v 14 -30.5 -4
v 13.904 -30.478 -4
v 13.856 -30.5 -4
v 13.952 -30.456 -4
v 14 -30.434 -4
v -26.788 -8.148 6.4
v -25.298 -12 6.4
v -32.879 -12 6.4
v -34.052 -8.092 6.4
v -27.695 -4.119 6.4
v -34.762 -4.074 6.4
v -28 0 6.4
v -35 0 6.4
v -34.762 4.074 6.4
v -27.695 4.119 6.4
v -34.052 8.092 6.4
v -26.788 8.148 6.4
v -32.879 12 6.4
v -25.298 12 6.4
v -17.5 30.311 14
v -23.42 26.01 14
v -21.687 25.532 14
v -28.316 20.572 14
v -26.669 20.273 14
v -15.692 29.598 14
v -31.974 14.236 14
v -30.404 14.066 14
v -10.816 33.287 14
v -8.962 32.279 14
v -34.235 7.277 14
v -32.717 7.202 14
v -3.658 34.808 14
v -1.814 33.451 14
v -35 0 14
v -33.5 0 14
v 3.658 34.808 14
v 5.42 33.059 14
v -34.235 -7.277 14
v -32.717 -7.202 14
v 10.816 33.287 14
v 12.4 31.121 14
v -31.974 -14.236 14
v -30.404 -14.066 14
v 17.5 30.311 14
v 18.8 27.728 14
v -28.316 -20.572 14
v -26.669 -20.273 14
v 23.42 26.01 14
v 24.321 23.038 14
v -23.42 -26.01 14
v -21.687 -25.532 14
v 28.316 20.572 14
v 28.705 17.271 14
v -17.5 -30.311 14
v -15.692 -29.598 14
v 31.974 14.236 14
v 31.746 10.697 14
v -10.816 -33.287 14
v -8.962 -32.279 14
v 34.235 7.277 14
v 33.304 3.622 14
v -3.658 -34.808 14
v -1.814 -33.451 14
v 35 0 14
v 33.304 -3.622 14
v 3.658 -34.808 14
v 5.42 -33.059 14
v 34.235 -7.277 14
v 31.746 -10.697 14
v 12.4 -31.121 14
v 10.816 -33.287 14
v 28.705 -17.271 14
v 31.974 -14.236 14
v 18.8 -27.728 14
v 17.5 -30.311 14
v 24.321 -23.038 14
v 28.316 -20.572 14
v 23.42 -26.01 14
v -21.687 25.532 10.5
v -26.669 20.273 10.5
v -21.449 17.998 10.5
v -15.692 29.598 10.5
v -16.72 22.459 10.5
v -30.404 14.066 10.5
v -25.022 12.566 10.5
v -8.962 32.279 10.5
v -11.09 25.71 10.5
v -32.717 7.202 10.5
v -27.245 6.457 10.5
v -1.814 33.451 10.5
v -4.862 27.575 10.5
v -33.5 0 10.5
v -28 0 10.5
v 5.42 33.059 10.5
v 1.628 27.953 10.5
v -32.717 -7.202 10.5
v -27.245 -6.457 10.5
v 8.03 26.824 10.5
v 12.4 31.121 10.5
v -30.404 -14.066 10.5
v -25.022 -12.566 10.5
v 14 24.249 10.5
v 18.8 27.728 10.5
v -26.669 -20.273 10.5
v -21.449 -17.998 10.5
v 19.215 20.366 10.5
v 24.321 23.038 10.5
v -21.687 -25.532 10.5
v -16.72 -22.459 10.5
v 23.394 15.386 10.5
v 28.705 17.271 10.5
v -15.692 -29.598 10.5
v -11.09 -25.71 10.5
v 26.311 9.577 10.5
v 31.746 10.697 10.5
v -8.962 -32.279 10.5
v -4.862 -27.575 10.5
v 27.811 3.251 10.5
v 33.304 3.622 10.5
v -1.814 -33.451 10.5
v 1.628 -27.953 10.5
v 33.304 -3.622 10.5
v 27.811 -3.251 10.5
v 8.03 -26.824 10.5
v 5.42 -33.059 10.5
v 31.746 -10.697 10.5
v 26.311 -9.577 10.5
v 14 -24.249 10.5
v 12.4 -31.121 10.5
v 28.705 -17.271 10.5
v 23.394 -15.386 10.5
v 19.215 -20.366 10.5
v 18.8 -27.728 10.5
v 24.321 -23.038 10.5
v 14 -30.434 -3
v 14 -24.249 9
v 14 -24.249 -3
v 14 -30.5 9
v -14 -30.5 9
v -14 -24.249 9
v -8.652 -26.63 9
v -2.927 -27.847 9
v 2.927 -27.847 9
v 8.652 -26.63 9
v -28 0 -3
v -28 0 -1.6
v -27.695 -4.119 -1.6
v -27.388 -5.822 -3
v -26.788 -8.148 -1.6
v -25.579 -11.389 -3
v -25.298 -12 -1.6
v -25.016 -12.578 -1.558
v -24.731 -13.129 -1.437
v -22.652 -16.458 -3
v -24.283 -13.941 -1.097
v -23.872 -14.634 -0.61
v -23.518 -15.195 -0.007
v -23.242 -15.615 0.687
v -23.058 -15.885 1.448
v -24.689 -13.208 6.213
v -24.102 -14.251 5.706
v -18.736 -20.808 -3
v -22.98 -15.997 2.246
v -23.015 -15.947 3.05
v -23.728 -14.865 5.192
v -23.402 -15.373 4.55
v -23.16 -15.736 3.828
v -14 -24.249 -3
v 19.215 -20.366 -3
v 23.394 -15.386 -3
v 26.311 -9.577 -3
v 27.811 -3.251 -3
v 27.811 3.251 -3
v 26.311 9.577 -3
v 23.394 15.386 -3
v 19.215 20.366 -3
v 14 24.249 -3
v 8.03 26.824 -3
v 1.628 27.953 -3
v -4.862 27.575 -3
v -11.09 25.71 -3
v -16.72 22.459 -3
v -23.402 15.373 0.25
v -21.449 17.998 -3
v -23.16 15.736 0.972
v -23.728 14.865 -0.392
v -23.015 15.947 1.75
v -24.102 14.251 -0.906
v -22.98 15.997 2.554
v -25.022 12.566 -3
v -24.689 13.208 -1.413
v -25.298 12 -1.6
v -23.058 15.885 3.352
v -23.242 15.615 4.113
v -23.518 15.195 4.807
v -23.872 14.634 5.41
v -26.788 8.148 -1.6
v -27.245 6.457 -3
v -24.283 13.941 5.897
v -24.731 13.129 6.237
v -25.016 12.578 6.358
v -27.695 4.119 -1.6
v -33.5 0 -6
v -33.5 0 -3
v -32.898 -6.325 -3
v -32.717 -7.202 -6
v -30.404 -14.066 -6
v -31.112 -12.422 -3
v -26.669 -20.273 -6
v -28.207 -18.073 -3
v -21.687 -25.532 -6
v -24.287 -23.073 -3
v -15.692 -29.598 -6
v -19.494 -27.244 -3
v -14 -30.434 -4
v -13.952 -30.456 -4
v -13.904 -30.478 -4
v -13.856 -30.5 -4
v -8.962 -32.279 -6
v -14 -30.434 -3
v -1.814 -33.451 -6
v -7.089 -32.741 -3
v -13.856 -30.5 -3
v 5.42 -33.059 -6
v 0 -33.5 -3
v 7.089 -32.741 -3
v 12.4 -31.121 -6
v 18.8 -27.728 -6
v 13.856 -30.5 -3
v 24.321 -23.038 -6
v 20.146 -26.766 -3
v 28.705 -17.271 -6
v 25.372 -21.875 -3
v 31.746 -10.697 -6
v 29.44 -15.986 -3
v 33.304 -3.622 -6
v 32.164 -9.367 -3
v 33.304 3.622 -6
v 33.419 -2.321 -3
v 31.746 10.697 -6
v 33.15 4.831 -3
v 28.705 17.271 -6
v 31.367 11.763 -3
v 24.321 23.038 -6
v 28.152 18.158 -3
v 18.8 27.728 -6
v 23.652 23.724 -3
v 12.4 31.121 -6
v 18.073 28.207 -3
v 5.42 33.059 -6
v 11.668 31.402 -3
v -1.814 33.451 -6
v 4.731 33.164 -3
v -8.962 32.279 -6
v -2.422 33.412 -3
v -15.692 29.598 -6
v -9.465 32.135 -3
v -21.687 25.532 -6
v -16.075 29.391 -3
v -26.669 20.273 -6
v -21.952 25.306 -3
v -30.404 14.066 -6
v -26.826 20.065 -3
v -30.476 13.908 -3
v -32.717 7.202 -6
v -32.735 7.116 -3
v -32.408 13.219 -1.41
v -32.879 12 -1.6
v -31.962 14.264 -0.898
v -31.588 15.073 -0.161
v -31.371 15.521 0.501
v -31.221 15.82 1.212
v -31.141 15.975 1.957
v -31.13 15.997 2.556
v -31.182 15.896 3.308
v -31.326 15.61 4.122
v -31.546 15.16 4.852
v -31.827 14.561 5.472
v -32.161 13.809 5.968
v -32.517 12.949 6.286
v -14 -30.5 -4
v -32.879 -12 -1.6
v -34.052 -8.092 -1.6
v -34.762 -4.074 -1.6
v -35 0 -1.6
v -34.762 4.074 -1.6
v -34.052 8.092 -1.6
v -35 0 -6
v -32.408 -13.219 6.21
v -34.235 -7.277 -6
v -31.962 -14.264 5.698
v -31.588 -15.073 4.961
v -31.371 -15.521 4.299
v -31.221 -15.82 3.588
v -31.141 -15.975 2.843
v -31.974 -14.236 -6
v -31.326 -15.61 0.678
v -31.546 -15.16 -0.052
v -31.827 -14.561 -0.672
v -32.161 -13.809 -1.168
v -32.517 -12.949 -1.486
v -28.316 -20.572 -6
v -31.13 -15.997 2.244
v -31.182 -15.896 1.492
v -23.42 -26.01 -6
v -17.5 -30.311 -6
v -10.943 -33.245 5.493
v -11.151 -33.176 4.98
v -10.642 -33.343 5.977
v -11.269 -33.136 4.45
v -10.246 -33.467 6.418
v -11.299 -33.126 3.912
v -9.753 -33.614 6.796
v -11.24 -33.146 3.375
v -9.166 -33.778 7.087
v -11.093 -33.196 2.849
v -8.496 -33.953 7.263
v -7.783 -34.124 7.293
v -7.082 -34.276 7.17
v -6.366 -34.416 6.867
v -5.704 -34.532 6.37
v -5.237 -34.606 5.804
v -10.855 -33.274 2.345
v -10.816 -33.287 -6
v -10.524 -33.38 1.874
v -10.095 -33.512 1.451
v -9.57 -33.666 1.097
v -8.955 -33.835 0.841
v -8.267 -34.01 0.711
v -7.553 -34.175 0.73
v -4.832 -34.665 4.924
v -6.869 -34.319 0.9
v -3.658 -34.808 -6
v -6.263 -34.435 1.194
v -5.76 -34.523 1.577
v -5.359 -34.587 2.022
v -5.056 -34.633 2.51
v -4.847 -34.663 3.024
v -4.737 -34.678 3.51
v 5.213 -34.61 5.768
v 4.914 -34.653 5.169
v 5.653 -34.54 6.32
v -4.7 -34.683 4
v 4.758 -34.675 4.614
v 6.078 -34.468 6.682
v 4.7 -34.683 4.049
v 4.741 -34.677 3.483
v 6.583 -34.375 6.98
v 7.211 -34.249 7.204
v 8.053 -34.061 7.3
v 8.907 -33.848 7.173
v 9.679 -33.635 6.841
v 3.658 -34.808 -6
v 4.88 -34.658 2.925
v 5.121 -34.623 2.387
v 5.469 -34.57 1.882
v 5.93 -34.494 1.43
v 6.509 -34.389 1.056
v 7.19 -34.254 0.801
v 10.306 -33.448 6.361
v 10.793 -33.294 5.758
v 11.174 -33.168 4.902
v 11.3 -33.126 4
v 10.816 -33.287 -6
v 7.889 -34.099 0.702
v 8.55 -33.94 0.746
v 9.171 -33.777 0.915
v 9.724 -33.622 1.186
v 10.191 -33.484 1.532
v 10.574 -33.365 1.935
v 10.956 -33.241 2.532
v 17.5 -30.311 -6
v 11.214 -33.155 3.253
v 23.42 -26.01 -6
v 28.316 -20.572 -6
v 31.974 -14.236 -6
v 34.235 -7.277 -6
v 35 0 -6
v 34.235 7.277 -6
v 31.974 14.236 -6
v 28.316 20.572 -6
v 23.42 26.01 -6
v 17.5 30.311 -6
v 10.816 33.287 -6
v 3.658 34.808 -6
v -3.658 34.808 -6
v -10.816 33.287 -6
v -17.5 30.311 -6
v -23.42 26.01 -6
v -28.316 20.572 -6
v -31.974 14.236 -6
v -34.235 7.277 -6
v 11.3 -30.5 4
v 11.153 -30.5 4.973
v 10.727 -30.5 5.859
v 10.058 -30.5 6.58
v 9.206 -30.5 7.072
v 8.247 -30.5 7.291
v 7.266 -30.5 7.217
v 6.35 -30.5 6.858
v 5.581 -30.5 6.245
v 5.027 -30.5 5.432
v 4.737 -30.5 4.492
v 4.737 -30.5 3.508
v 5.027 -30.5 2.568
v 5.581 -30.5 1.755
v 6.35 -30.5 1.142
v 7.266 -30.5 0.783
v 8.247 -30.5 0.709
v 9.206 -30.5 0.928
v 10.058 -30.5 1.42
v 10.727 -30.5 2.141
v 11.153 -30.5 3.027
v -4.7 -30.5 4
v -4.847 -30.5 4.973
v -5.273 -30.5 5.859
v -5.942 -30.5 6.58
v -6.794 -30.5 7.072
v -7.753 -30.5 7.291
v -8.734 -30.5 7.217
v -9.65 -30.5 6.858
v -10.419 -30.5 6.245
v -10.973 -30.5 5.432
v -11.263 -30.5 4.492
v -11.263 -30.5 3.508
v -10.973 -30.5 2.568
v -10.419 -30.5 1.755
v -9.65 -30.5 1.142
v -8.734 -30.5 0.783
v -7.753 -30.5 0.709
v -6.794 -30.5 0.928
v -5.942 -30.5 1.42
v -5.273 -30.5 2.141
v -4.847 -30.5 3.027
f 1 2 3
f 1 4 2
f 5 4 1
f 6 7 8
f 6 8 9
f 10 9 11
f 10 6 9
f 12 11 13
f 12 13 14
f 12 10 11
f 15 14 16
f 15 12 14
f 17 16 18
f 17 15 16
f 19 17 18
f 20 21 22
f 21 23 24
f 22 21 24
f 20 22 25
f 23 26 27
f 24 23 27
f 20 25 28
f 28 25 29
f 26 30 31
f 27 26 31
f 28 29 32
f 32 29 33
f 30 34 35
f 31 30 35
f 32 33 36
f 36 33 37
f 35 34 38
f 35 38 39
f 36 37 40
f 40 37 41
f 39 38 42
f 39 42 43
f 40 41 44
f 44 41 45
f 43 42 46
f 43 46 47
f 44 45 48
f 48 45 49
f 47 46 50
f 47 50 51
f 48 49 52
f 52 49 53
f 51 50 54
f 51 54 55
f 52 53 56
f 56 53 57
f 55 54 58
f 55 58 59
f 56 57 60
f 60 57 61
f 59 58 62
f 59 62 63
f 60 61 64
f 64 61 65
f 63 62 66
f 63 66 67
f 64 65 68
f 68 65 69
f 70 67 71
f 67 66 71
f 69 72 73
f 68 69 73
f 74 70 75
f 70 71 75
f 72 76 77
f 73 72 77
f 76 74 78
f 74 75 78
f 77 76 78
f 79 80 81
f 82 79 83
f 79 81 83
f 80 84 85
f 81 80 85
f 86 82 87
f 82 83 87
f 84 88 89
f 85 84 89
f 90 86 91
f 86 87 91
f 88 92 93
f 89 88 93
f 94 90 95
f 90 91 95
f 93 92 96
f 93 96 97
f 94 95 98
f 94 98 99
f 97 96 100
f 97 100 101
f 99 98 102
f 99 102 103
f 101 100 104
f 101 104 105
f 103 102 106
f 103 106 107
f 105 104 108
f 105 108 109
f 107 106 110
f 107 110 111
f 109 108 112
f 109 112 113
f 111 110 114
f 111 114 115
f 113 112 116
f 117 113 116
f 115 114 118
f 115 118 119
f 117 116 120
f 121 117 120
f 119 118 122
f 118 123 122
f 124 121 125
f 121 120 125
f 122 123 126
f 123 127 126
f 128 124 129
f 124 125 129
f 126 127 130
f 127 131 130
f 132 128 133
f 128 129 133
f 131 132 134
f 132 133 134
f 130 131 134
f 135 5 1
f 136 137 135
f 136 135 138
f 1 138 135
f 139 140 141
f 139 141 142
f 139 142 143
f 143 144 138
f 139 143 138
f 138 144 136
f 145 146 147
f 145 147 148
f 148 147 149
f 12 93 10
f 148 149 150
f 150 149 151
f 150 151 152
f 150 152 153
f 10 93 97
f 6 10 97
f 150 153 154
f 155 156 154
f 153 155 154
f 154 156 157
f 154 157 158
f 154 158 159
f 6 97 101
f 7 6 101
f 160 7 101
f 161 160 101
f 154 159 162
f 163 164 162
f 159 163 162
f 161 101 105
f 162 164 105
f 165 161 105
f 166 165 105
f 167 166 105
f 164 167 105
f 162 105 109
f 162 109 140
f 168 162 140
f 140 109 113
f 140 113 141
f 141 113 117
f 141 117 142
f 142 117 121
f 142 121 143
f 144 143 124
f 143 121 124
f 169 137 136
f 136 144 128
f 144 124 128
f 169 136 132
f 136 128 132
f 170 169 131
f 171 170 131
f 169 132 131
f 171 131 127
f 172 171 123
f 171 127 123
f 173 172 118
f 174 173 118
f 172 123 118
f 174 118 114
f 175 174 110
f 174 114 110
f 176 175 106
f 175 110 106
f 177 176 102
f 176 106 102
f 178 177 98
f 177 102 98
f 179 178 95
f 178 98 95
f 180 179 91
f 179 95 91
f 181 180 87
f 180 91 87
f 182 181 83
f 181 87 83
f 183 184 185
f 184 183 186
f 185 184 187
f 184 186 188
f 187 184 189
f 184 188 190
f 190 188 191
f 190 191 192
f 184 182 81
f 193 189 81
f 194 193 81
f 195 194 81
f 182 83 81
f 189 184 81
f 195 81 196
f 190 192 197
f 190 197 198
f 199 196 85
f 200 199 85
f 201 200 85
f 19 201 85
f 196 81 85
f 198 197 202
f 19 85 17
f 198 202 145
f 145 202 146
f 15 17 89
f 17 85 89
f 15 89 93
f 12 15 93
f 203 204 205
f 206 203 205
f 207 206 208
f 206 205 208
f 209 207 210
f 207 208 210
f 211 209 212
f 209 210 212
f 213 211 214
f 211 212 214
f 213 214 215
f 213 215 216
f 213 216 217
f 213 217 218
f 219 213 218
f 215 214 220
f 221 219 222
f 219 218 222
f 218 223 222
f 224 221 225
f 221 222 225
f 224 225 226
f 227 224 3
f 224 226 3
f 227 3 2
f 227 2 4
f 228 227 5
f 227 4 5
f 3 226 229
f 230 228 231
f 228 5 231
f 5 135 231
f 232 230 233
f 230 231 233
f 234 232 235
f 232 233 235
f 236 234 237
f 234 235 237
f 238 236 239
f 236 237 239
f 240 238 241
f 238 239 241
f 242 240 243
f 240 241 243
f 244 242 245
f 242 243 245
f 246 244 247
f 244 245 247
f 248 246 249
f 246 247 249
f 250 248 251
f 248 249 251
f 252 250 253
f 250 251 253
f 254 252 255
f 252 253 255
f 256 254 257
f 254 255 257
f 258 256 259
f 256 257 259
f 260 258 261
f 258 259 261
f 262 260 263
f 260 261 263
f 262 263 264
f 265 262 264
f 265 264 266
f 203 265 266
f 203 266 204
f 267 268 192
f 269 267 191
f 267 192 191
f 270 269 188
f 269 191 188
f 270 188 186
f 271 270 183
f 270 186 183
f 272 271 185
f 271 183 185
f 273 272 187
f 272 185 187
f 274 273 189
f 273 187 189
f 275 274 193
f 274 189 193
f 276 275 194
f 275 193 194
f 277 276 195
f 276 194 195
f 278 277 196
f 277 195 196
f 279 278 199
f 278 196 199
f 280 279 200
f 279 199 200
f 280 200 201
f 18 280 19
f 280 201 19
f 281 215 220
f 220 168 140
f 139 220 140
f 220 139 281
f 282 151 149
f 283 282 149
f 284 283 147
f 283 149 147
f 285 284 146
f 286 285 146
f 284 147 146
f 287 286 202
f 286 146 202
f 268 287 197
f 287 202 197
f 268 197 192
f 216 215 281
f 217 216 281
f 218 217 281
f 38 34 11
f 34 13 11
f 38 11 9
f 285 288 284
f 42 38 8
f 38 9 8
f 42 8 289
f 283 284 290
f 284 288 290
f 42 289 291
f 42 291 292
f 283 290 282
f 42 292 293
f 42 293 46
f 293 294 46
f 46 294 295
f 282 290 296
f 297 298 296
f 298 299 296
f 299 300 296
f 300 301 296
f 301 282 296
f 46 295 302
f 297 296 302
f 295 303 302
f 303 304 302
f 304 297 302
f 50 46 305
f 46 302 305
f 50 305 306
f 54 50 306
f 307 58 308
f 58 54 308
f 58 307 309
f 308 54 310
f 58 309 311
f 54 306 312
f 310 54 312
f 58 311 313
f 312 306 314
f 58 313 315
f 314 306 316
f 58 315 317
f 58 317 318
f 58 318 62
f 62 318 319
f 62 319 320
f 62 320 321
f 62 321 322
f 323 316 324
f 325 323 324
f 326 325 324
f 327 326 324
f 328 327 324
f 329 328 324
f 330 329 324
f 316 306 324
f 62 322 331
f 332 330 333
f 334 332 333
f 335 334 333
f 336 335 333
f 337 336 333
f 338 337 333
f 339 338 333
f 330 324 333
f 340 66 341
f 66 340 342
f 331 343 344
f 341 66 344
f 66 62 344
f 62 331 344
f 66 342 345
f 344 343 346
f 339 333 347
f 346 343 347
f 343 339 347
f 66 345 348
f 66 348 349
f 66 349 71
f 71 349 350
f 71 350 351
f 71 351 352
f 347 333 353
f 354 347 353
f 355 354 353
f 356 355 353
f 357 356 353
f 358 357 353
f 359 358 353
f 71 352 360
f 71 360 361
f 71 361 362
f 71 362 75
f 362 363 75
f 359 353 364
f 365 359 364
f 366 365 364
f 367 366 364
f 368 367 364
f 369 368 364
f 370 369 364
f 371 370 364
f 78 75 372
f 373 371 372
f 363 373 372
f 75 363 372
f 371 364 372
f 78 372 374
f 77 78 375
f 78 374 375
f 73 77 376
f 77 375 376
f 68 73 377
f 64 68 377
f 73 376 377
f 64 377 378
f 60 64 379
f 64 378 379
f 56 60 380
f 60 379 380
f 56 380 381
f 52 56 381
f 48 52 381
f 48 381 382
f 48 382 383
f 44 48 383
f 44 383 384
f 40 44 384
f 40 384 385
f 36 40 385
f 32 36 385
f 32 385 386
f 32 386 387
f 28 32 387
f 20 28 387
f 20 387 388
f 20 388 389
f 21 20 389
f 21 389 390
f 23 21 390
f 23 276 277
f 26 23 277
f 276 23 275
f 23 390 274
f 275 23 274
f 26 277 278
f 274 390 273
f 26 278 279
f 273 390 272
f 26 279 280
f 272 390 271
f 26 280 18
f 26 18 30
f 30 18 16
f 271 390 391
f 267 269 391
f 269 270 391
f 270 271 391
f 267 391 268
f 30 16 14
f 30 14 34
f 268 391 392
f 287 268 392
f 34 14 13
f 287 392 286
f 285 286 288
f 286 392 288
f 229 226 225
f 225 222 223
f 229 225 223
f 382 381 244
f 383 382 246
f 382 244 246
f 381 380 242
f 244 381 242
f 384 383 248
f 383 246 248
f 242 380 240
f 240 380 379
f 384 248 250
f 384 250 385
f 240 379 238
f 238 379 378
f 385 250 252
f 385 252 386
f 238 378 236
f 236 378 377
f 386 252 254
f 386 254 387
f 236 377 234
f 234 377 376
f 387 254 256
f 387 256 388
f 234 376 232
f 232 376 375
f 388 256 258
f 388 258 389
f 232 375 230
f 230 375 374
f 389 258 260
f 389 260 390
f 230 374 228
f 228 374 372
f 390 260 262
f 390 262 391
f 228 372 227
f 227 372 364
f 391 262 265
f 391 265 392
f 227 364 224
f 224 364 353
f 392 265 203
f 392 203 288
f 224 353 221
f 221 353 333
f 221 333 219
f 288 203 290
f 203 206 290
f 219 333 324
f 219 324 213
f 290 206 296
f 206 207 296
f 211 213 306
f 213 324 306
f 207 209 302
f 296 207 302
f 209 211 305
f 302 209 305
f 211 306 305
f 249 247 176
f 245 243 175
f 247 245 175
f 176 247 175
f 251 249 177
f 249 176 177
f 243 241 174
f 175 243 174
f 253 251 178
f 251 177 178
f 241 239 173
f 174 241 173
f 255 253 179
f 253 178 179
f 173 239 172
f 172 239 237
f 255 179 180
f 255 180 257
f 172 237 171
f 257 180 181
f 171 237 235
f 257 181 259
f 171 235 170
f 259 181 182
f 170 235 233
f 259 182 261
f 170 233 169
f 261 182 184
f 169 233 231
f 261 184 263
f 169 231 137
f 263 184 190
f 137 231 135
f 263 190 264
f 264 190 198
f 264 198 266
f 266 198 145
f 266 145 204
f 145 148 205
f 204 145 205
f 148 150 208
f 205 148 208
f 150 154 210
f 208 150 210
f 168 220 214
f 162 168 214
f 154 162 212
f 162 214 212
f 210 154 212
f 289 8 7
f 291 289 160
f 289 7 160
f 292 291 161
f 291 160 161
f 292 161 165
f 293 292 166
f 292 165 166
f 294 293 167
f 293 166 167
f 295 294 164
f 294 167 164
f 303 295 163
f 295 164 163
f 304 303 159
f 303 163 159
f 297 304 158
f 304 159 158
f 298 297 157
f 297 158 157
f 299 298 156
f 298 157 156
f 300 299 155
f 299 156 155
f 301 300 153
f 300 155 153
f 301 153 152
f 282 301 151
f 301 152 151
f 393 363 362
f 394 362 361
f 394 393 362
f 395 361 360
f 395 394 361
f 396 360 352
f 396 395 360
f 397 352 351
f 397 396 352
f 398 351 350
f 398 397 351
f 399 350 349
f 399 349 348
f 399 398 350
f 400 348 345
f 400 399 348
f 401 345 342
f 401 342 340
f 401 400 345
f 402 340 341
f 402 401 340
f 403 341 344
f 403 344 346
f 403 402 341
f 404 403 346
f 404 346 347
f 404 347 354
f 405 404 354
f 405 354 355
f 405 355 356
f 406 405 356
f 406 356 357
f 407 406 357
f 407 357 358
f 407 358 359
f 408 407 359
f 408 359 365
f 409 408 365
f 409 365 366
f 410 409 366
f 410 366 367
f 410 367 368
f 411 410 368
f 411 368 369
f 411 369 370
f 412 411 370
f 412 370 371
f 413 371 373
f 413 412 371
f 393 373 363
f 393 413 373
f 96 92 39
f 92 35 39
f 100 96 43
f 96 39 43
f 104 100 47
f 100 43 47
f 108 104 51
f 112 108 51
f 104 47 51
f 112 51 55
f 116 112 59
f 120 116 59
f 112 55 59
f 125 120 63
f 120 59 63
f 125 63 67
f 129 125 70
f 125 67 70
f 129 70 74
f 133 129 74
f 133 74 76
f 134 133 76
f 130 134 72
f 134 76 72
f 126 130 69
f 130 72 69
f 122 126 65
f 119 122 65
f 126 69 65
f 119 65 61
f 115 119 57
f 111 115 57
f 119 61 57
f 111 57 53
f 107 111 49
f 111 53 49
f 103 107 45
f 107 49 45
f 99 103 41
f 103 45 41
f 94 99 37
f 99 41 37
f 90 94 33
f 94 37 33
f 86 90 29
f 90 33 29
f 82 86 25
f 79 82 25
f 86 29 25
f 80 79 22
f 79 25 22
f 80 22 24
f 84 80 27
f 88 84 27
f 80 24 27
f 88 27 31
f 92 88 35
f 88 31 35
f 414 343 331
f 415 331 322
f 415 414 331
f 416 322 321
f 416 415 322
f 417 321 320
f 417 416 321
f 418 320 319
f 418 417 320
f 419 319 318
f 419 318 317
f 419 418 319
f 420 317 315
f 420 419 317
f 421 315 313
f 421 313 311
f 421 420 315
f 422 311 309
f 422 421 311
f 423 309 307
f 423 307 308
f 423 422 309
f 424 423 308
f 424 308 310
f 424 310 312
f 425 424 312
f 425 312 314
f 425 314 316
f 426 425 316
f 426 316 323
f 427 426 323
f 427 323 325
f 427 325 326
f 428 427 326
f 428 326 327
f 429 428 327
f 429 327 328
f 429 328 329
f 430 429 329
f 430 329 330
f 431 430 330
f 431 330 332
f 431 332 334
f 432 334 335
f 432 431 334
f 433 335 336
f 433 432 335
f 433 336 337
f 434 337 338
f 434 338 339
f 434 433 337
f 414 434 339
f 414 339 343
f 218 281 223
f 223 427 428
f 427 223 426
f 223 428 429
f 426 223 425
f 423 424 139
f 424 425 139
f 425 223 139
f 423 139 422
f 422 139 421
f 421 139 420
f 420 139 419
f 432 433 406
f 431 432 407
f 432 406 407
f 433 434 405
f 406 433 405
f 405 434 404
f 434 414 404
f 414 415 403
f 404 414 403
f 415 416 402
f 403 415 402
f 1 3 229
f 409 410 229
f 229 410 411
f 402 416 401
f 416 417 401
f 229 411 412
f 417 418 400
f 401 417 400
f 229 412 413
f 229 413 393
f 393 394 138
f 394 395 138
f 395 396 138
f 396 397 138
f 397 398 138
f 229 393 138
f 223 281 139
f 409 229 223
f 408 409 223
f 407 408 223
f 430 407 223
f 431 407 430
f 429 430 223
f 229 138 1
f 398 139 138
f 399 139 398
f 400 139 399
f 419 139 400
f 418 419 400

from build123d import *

# Parameters (mm, degrees)
SKETCH007_W  = 28
SKETCH007_H  = 13
PAD003_DEPTH = 14.5
SKETCH008_R  = 3.3
PAD004_DEPTH = 10
PAD005_DEPTH = 16


with BuildPart() as body003:
    # Sketch007 → Pad003 (new body)
    with BuildSketch(Plane.XZ):
        with Locations((0, 2.5)):
            Rectangle(SKETCH007_W, SKETCH007_H)
    extrude(amount=PAD003_DEPTH)

    # Sketch008 (on Face6 of Pad003) → Pad004 (join)
    with BuildSketch(Plane.XZ.offset(14.5)):
        with Locations((-8, 4)):
            Circle(SKETCH008_R)
        with Locations((8, 4)):
            Circle(SKETCH008_R)
    extrude(amount=PAD004_DEPTH)


with BuildPart() as body003_1:
    # Body003 placement: moved
    add(body003.part.moved(Location((0, -16, 0))))


with BuildPart() as body004:
    # Sketch009 → Pad005 (new body)
    with BuildSketch(Plane.YZ):
        with BuildLine():
            ThreePointArc((-12, 6.4), (-16, 2.4), (-12, -1.6))
            Line((-12, -1.6), (12, -1.6))
            ThreePointArc((12, -1.6), (16, 2.4), (12, 6.4))
            Line((-12, 6.4), (12, 6.4))
        make_face()
    extrude(amount=-PAD005_DEPTH)


with BuildPart() as body004_1:
    # Body004 placement: moved
    add(body004.part.moved(Location((-22, 0, 0))))


with BuildPart() as body002:
    # Sketch006 → Revolution (revolve)
    with BuildSketch(Plane.XZ):
        Polygon((-35, -6), (-33.5, -6), (-33.5, -3), (-28, -3), (-28, 10.5), (-33.5, 10.5), (-33.5, 14), (-35, 14), align=None)
    revolve(axis=Axis((0, 0, 0), (0, 0, 1)))

    # Boolean: cut Body003
    add(body003_1.part, mode=Mode.SUBTRACT)

    # Boolean001: cut Body004
    add(body004_1.part, mode=Mode.SUBTRACT)


solid = body002.part
